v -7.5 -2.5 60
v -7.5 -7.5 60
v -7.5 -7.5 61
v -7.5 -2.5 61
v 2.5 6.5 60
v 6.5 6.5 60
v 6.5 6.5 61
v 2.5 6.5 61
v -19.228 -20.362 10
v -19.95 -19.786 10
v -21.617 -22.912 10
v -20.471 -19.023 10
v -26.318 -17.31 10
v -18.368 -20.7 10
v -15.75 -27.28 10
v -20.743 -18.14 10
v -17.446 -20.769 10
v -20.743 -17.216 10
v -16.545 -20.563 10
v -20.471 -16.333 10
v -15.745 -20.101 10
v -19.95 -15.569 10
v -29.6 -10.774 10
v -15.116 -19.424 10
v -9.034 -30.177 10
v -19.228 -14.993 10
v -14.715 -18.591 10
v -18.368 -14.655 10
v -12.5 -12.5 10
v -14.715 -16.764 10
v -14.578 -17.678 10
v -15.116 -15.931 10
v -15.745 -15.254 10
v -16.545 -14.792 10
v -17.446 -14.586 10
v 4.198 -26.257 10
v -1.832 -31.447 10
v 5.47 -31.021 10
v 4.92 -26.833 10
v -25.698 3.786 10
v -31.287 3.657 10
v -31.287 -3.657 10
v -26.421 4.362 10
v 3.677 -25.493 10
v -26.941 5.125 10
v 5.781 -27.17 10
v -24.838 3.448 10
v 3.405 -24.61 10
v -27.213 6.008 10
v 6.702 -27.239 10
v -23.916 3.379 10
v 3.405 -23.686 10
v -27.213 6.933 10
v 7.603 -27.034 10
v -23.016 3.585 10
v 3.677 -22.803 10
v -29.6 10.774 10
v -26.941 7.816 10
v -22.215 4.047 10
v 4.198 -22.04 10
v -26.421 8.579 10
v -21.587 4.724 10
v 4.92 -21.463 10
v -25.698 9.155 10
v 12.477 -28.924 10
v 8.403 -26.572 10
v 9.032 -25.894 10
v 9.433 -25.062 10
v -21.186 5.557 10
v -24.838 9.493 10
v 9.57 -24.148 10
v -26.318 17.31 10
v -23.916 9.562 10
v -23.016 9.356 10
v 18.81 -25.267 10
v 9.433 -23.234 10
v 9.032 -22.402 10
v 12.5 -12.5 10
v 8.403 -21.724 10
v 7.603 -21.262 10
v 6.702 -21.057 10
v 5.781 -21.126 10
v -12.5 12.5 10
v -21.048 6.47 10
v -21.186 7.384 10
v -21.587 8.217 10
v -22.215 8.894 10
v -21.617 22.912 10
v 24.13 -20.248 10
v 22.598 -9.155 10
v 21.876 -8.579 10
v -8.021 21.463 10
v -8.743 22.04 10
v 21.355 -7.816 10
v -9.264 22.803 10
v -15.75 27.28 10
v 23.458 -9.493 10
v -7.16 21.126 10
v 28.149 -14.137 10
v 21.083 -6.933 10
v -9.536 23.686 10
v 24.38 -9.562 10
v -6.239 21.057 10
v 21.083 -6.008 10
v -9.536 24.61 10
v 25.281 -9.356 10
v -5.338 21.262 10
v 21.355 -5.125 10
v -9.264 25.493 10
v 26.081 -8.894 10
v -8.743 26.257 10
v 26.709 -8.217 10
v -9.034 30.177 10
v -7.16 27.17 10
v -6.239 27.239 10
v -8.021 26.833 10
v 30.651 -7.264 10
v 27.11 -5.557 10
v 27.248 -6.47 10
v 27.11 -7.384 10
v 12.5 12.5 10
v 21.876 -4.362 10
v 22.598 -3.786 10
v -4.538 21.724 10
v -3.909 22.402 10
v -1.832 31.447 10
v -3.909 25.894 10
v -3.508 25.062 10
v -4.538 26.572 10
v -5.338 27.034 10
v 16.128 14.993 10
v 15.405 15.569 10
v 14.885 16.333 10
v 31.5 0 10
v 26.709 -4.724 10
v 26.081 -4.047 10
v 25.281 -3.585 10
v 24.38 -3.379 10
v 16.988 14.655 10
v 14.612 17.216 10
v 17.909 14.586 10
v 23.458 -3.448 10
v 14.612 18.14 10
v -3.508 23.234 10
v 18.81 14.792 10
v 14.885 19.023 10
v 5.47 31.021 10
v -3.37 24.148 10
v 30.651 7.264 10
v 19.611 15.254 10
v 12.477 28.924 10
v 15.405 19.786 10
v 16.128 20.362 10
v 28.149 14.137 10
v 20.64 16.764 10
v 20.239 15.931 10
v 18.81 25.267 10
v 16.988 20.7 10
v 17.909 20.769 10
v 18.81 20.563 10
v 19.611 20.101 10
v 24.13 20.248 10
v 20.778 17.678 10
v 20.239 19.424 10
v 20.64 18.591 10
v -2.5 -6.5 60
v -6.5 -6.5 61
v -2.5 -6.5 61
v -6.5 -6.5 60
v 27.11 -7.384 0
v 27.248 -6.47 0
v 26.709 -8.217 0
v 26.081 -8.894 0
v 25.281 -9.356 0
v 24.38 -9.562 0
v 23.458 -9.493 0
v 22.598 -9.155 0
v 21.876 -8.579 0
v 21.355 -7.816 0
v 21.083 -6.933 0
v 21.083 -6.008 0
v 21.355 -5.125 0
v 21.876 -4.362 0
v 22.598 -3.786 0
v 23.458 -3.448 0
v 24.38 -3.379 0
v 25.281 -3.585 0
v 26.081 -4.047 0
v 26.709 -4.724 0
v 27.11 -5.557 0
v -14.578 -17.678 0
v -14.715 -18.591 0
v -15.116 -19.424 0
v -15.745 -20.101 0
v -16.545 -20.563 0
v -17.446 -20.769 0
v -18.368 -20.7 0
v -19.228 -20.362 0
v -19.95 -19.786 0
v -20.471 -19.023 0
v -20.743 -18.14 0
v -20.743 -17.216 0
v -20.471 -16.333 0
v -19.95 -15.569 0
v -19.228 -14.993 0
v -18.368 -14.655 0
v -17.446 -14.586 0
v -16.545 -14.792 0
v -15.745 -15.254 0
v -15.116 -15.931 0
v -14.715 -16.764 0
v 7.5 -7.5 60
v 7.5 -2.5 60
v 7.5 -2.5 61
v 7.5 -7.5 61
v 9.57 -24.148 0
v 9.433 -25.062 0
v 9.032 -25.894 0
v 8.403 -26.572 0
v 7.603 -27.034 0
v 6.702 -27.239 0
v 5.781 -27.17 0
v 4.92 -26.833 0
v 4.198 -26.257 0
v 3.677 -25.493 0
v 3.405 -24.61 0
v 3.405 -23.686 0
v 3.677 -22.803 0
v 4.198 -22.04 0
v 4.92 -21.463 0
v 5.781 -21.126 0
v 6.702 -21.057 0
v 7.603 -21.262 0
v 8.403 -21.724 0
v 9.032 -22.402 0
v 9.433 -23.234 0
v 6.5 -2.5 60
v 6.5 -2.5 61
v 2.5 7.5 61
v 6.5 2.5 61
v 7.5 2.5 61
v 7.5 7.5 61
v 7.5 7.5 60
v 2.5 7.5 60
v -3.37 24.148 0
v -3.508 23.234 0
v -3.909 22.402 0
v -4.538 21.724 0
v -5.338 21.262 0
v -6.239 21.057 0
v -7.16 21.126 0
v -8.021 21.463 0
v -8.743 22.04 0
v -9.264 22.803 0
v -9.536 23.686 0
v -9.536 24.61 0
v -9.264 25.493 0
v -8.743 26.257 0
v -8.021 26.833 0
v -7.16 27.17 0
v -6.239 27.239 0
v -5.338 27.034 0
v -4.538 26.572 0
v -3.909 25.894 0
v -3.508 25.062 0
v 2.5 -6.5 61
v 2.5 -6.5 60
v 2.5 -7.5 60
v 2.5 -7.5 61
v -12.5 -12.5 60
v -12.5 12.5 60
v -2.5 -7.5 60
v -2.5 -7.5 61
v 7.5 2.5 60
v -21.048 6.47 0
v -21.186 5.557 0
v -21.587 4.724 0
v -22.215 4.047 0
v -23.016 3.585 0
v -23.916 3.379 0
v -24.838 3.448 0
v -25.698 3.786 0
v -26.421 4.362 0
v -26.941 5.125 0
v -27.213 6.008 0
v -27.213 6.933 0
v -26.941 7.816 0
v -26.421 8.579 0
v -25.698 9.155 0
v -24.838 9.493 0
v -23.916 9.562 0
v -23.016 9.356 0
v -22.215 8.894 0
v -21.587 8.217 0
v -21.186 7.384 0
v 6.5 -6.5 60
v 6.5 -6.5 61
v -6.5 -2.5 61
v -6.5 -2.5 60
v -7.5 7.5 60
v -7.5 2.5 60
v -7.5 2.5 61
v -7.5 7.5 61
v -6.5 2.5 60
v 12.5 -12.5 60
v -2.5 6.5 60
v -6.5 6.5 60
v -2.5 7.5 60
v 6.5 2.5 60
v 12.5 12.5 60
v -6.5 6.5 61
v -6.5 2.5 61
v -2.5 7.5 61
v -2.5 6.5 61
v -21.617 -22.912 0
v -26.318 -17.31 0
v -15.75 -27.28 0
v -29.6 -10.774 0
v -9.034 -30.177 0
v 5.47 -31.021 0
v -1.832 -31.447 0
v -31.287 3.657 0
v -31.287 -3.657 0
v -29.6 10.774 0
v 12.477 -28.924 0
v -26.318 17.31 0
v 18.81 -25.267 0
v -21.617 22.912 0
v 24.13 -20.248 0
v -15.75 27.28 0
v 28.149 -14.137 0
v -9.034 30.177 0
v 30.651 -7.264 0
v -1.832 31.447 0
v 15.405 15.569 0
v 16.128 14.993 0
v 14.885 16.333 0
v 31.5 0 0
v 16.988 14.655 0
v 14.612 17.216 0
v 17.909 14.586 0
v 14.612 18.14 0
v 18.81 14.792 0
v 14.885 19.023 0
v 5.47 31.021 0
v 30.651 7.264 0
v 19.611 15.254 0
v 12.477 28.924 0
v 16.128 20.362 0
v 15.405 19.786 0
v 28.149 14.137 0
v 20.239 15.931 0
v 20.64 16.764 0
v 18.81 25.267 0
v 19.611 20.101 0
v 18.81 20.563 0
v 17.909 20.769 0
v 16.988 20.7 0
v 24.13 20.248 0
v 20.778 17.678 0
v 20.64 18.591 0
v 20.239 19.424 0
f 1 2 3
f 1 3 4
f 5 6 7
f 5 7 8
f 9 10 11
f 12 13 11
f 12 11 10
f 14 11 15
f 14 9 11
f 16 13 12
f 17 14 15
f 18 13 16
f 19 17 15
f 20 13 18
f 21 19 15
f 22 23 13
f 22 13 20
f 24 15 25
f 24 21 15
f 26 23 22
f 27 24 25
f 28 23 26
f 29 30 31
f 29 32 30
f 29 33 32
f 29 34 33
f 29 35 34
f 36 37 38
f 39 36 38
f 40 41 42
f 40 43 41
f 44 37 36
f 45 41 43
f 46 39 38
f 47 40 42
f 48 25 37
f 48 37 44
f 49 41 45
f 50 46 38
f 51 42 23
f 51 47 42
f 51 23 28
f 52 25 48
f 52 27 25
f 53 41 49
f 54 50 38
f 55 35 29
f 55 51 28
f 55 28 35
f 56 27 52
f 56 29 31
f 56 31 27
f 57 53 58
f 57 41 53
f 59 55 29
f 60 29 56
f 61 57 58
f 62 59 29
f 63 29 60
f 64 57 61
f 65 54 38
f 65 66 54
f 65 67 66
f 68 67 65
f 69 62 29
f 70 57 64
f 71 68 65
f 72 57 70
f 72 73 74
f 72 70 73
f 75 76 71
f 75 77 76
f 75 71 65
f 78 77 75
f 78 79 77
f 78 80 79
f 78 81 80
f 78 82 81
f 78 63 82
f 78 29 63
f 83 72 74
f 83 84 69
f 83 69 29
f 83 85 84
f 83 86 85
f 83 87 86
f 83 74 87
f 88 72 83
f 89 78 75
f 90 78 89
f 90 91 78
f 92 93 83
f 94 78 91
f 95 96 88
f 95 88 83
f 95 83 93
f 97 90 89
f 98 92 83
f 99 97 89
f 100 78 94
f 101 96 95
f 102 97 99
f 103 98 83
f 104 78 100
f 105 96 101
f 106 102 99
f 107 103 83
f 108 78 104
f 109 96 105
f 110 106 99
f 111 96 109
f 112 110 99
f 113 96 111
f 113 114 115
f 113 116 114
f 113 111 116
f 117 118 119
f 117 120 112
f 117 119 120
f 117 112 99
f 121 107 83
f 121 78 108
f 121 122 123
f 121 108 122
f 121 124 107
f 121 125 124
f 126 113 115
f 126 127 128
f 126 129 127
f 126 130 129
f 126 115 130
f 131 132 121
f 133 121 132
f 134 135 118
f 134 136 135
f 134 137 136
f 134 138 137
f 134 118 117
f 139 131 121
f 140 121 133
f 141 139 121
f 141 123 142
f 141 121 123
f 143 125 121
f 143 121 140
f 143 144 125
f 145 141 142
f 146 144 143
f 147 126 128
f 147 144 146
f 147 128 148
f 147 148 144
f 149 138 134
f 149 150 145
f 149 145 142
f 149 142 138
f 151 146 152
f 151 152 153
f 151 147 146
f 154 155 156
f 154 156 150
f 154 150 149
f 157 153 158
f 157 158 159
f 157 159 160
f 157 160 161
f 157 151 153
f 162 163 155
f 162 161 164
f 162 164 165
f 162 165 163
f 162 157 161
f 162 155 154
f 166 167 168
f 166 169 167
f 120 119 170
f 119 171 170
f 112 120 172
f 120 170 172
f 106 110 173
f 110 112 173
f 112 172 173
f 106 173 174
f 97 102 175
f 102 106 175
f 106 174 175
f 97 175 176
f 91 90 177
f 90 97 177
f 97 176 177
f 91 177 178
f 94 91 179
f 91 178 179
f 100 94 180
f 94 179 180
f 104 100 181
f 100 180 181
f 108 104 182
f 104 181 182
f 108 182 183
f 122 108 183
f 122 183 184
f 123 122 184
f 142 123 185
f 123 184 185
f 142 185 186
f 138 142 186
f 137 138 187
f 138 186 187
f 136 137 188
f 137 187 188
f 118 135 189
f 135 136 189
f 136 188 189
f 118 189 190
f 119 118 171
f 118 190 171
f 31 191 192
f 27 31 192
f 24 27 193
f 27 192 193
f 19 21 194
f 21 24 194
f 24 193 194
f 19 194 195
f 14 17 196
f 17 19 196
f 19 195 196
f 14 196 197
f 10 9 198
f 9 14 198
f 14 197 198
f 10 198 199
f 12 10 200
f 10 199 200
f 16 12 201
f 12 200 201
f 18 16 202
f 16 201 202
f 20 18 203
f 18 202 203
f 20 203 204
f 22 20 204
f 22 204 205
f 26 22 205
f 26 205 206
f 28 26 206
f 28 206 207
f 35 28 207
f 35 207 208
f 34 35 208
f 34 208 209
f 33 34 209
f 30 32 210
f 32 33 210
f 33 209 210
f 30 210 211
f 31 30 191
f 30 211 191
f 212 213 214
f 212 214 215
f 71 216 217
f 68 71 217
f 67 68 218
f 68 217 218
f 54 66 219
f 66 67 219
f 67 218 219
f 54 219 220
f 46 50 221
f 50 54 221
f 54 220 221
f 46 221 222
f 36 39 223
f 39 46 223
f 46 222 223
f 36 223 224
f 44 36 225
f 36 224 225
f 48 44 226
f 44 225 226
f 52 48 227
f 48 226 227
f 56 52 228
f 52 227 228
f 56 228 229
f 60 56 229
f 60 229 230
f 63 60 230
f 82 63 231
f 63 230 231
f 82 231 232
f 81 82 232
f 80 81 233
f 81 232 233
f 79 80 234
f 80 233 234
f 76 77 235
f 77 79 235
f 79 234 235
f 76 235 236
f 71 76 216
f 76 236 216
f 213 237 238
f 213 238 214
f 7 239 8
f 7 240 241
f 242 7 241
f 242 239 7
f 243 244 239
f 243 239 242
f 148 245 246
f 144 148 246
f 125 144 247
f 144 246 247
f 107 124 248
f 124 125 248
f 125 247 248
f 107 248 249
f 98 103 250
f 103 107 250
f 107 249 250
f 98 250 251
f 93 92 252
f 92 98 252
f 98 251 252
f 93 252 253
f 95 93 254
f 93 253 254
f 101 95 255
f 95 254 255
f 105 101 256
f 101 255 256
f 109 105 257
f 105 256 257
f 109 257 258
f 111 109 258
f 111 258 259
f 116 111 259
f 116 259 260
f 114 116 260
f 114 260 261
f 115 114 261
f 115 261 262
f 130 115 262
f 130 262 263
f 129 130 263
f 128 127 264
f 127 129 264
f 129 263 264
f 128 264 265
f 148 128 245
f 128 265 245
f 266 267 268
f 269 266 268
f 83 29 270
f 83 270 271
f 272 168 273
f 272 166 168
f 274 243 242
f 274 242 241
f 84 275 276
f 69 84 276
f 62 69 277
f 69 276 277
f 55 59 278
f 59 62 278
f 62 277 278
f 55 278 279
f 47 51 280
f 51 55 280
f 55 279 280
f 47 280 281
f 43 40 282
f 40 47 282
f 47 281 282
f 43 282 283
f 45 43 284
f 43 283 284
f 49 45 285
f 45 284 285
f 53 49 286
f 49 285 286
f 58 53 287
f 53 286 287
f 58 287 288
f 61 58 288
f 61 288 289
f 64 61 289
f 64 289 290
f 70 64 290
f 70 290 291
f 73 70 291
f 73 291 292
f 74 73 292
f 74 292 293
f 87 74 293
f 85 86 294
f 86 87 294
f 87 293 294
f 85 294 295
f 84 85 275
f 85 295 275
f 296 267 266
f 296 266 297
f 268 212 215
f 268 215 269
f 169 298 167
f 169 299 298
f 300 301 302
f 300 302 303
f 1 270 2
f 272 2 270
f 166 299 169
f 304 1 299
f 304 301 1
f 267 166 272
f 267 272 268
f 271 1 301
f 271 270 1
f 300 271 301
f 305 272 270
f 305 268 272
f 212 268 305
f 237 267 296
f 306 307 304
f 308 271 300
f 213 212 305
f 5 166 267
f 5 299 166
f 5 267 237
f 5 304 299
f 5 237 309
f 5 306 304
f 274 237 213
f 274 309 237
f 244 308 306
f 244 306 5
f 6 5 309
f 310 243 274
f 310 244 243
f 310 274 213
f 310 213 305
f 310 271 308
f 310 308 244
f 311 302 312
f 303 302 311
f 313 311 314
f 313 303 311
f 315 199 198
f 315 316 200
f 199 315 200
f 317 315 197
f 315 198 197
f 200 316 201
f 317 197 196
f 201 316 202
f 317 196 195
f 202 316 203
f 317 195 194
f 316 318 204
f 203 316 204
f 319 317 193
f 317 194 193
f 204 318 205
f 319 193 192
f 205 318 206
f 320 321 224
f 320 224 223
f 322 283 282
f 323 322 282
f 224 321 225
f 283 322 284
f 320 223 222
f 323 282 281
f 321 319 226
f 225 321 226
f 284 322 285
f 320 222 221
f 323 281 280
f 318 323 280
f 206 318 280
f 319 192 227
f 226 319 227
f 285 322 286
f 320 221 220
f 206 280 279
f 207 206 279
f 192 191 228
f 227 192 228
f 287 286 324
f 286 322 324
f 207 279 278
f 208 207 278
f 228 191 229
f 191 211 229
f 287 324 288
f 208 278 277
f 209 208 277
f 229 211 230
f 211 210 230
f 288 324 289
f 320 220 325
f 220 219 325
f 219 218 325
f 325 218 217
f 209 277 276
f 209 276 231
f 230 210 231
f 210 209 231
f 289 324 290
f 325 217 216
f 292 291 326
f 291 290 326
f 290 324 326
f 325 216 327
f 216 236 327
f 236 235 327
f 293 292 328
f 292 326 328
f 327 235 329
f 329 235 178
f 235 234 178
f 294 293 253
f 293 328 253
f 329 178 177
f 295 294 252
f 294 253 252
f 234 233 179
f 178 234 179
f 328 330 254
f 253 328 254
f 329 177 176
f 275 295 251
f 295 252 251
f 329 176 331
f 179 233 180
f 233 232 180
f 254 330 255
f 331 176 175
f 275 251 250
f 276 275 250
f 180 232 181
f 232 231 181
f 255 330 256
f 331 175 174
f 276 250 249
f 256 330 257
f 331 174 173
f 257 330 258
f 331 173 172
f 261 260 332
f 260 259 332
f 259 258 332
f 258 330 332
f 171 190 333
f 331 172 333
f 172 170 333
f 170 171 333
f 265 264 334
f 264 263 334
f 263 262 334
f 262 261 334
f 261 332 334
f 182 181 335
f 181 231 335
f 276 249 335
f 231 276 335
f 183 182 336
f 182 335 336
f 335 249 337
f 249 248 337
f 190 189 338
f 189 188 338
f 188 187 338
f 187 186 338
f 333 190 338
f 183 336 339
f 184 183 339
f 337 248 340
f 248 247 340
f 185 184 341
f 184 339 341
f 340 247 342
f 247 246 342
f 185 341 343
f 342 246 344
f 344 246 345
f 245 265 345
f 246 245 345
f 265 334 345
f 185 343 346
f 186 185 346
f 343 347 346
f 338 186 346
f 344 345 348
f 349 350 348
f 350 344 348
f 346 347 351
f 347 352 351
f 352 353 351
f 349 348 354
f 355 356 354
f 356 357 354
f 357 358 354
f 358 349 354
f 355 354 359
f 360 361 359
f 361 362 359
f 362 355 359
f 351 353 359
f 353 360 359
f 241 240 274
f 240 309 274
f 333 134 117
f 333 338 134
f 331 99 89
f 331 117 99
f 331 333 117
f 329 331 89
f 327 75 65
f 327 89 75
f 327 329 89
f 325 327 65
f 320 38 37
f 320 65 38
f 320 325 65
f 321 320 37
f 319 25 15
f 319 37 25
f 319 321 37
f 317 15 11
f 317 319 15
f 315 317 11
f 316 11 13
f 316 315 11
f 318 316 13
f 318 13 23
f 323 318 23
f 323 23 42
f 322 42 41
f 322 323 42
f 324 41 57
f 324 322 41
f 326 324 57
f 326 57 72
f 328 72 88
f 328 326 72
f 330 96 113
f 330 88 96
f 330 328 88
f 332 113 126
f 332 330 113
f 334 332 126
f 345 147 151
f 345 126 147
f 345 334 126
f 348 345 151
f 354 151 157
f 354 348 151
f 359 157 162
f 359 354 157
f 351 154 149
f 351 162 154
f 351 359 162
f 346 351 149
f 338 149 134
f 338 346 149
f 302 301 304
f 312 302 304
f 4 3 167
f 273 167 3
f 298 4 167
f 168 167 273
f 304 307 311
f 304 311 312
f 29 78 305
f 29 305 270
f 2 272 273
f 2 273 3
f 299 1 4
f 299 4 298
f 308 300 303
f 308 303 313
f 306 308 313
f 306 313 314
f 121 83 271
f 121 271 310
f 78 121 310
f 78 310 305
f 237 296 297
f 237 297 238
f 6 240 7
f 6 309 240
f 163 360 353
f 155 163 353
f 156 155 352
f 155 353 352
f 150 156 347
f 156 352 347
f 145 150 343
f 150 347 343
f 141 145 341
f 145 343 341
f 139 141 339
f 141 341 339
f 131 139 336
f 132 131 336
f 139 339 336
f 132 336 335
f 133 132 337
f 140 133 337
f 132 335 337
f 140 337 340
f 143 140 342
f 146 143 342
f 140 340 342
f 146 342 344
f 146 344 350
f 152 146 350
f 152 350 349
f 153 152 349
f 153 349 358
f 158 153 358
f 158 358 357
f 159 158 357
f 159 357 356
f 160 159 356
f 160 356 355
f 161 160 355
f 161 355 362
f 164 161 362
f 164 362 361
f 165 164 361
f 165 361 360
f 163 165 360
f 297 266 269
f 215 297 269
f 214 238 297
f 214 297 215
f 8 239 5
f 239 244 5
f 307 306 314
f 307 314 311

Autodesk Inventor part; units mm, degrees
ref_plane "YZ Plane" through (0, 0, 0) normal (1, 0, 0) x (0, 1, 0)
ref_plane "XZ Plane" through (0, 0, 0) normal (0, 1, 0) x (-1, 0, 0)
ref_plane "XY Plane" through (0, 0, 0) normal (0, 0, 1) x (1, 0, 0)
sketch "Sketch1" plane through (0, 0, 0) normal (0, 0, 1) x (1, 0, 0)
  circle A0 centre (0, 0) radius 31.5
  line L0 (0, 0) -> (17.6777, 17.6777)
  line L1 (0, 0) -> (25, 0) construction
  circle A1 centre (17.6777, 17.6777) radius 3.1
  circle A2 centre (-6.4705, 24.1481) radius 3.1
  circle A3 centre (-24.1481, 6.4705) radius 3.1
  circle A4 centre (-17.6777, -17.6777) radius 3.1
  circle A5 centre (6.4705, -24.1481) radius 3.1
  circle A6 centre (24.1481, -6.4705) radius 3.1
  dimension "d0" = 63
  dimension "d1" = 25
  dimension "d2" = 45
  dimension "d3" = 6.2
  dimension "d6" = 360
extrude "Extrusion1" add sketch "Sketch1" along normal blind 10
sketch "Sketch2" plane through (0, 0, 10) normal (0, 0, 1) x (1, 0, 0)
  line L0 (12.5, -12.5) -> (-12.5, -12.5)
  line L1 (-12.5, -12.5) -> (-12.5, 12.5)
  line L2 (-12.5, 12.5) -> (12.5, 12.5)
  line L3 (12.5, 12.5) -> (12.5, -12.5)
  line L4 (12.5, -12.5) -> (-12.5, 12.5) construction
  line L5 (-12.5, -12.5) -> (12.5, 12.5) construction
  point P0 (0, 0)
  dimension "d10" = 25
  dimension "d11" = 25
extrude "Extrusion2" add sketch "Sketch2" along normal blind 50
sketch "Sketch4" plane through (0, 0, 60) normal (0, 0, 1) x (1, 0, 0)
  line L0 (7.5, -7.5) -> (-7.5, -7.5)
  line L1 (-7.5, -7.5) -> (-7.5, 7.5)
  line L2 (-7.5, 7.5) -> (7.5, 7.5)
  line L3 (7.5, 7.5) -> (7.5, -7.5)
  line L4 (7.5, -7.5) -> (-7.5, 7.5) construction
  line L5 (-7.5, -7.5) -> (7.5, 7.5) construction
  line L6 (6.5, 6.5) -> (-6.5, 6.5)
  line L7 (-6.5, 6.5) -> (-6.5, -6.5)
  line L8 (-6.5, -6.5) -> (6.5, -6.5)
  line L9 (6.5, -6.5) -> (6.5, 6.5)
  line L10 (-9.4383, 2.5) -> (11.9316, 2.5)
  line L11 (-9.4383, -2.5) -> (9.2053, -2.5)
  line L12 (-2.5, 9.4032) -> (-2.5, -10.6036)
  line L13 (2.5, 9.4032) -> (2.5, -9.3606)
  point P0 (0, 0)
  point P1 (2.5, 7.5)
  point P2 (2.5, 6.5)
  point P3 (6.5, 2.5)
  point P4 (7.5, 2.5)
  point P5 (2.5, -6.5)
  point P6 (2.5, -7.5)
  point P7 (7.5, -2.5)
  point P8 (6.5, -2.5)
  point P9 (-2.5, -7.5)
  point P10 (-2.5, -6.5)
  point P11 (-6.5, -2.5)
  point P12 (-7.5, -2.5)
  point P13 (-2.5, 6.5)
  point P14 (-2.5, 7.5)
  point P15 (-7.5, 2.5)
  point P16 (-6.5, 2.5)
  dimension "d27" = 15
  dimension "d28" = 15
  dimension "d29" = 1
  dimension "d30" = 18.7639
  dimension "d31" = 5
  dimension "d32" = 5
  dimension "d33" = 5
  dimension "d34" = 5
extrude "Extrusion4" add sketch "Sketch4" along normal blind 1 contours L0 L13 L8 L9 L11 L3 | L0 L1 L11 L7 L8 L12 | L10 L9 L6 L13 L2 L3 | L1 L2 L12 L6 L7 L10
properties part number "soporte p1"
